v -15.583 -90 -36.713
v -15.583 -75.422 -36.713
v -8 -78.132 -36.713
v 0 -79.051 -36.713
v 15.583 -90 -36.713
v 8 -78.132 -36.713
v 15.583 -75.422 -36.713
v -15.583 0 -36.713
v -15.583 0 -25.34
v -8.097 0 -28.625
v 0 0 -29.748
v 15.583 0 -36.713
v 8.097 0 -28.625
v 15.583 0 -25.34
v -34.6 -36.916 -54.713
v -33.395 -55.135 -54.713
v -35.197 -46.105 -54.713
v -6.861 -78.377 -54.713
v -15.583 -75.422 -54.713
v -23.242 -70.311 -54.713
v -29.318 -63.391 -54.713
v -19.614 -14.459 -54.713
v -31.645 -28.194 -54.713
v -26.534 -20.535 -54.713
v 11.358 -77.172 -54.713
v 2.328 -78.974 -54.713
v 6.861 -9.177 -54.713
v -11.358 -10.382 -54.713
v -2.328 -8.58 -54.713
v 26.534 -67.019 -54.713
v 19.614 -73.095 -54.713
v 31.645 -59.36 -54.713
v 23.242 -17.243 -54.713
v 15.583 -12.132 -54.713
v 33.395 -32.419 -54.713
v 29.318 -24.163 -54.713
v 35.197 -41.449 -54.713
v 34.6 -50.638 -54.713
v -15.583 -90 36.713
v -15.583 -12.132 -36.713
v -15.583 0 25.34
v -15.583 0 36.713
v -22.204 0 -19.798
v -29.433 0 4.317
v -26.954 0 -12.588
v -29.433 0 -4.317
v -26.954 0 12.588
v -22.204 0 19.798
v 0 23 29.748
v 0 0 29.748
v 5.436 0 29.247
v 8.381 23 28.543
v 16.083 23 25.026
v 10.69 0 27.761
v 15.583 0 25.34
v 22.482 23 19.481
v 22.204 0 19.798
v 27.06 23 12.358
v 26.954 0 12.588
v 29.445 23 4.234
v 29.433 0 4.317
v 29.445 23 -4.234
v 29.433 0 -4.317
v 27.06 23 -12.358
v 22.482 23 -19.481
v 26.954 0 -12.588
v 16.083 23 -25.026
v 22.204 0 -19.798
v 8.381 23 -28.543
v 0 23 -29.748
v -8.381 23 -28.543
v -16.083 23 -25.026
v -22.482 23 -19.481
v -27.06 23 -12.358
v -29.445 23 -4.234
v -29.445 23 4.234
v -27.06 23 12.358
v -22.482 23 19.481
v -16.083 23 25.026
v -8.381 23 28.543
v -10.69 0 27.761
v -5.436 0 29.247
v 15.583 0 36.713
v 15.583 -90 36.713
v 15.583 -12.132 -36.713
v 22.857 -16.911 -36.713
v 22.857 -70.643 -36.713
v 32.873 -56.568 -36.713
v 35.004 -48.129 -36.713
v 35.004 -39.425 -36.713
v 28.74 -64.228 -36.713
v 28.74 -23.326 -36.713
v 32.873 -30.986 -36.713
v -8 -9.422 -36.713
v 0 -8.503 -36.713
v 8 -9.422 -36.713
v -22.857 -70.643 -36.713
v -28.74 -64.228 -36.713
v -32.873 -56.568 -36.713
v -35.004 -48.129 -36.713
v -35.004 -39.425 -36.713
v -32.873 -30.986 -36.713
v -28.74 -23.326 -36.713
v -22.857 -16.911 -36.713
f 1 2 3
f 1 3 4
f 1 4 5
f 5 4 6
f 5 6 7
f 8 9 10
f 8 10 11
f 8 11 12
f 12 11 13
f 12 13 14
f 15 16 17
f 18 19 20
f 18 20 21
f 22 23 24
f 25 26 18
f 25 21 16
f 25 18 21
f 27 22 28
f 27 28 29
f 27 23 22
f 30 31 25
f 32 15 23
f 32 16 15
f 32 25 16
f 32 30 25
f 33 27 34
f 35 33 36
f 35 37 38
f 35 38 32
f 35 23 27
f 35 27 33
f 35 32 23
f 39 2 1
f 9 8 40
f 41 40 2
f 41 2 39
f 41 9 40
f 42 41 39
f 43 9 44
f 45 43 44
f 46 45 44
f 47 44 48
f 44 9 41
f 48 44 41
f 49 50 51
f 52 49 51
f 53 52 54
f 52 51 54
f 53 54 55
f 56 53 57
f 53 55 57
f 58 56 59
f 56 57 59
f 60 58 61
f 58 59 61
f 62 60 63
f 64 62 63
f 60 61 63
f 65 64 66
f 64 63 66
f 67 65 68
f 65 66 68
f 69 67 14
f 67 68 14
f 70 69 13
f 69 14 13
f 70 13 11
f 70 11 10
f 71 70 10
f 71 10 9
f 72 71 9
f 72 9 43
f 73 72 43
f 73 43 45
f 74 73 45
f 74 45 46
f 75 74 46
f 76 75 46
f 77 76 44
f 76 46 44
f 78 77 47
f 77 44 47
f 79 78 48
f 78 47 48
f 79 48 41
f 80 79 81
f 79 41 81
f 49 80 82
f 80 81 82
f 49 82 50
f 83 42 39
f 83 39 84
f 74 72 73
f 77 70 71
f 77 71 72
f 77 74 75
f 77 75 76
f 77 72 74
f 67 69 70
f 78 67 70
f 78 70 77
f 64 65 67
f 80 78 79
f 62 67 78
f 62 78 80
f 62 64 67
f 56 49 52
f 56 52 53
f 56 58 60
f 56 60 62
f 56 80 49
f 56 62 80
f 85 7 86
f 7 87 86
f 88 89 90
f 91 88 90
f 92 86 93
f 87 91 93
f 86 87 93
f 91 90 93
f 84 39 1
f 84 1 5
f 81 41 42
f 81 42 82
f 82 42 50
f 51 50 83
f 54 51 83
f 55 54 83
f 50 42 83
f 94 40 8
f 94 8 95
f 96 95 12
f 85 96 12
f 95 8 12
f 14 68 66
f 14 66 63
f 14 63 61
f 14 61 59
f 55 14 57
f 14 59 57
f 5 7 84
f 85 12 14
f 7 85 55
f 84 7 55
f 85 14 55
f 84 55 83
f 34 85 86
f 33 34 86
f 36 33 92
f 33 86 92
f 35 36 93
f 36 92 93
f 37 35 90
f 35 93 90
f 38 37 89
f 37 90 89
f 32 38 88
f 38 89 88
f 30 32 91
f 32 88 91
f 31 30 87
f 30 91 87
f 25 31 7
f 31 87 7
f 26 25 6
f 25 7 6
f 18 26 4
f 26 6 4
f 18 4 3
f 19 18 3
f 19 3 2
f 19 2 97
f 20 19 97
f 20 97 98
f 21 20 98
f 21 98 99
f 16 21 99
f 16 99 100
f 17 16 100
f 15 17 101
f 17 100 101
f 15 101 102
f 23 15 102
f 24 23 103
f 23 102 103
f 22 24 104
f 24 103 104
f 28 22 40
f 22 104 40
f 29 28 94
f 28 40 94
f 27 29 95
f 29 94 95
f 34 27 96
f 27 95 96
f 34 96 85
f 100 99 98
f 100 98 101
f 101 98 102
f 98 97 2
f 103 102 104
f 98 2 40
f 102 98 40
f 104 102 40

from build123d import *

# Parameters (mm, degrees)
SKETCH_1_R      = 29.748261452
EXTRUDE_1_DEPTH = 23
SKETCH_5_W      = 31.165698276
SKETCH_5_H      = 73.42599541
EXTRUDE_4_DEPTH = 90
SKETCH_6_R      = 35.273996594
EXTRUDE_5_DEPTH = 18


with BuildPart() as part:
    # 草图1 → 凸台-拉伸1 (new body)
    with BuildSketch(Plane(origin=(0, 0, 0), x_dir=(1, 0, 0), z_dir=(0, 1, 0))):
        with Locations(Location((0, 0, 0), (0, 0, 270))):
            Circle(SKETCH_1_R)
    extrude(amount=EXTRUDE_1_DEPTH)

    # 草图5 → 凸台-拉伸4 (add)
    with BuildSketch(Plane.XZ):
        Rectangle(SKETCH_5_W, SKETCH_5_H)
    extrude(amount=EXTRUDE_4_DEPTH)

    # 草图6 → 凸台-拉伸5 (add)
    with BuildSketch(Plane(origin=(0, 0, -36.712997705), x_dir=(-1, 0, 0), z_dir=(0, 0, -1))):
        with Locations(Location((0, -43.77696479, 0), (0, 0, 116.216607407))):
            Circle(SKETCH_6_R)
    extrude(amount=EXTRUDE_5_DEPTH)


solid = part.part
